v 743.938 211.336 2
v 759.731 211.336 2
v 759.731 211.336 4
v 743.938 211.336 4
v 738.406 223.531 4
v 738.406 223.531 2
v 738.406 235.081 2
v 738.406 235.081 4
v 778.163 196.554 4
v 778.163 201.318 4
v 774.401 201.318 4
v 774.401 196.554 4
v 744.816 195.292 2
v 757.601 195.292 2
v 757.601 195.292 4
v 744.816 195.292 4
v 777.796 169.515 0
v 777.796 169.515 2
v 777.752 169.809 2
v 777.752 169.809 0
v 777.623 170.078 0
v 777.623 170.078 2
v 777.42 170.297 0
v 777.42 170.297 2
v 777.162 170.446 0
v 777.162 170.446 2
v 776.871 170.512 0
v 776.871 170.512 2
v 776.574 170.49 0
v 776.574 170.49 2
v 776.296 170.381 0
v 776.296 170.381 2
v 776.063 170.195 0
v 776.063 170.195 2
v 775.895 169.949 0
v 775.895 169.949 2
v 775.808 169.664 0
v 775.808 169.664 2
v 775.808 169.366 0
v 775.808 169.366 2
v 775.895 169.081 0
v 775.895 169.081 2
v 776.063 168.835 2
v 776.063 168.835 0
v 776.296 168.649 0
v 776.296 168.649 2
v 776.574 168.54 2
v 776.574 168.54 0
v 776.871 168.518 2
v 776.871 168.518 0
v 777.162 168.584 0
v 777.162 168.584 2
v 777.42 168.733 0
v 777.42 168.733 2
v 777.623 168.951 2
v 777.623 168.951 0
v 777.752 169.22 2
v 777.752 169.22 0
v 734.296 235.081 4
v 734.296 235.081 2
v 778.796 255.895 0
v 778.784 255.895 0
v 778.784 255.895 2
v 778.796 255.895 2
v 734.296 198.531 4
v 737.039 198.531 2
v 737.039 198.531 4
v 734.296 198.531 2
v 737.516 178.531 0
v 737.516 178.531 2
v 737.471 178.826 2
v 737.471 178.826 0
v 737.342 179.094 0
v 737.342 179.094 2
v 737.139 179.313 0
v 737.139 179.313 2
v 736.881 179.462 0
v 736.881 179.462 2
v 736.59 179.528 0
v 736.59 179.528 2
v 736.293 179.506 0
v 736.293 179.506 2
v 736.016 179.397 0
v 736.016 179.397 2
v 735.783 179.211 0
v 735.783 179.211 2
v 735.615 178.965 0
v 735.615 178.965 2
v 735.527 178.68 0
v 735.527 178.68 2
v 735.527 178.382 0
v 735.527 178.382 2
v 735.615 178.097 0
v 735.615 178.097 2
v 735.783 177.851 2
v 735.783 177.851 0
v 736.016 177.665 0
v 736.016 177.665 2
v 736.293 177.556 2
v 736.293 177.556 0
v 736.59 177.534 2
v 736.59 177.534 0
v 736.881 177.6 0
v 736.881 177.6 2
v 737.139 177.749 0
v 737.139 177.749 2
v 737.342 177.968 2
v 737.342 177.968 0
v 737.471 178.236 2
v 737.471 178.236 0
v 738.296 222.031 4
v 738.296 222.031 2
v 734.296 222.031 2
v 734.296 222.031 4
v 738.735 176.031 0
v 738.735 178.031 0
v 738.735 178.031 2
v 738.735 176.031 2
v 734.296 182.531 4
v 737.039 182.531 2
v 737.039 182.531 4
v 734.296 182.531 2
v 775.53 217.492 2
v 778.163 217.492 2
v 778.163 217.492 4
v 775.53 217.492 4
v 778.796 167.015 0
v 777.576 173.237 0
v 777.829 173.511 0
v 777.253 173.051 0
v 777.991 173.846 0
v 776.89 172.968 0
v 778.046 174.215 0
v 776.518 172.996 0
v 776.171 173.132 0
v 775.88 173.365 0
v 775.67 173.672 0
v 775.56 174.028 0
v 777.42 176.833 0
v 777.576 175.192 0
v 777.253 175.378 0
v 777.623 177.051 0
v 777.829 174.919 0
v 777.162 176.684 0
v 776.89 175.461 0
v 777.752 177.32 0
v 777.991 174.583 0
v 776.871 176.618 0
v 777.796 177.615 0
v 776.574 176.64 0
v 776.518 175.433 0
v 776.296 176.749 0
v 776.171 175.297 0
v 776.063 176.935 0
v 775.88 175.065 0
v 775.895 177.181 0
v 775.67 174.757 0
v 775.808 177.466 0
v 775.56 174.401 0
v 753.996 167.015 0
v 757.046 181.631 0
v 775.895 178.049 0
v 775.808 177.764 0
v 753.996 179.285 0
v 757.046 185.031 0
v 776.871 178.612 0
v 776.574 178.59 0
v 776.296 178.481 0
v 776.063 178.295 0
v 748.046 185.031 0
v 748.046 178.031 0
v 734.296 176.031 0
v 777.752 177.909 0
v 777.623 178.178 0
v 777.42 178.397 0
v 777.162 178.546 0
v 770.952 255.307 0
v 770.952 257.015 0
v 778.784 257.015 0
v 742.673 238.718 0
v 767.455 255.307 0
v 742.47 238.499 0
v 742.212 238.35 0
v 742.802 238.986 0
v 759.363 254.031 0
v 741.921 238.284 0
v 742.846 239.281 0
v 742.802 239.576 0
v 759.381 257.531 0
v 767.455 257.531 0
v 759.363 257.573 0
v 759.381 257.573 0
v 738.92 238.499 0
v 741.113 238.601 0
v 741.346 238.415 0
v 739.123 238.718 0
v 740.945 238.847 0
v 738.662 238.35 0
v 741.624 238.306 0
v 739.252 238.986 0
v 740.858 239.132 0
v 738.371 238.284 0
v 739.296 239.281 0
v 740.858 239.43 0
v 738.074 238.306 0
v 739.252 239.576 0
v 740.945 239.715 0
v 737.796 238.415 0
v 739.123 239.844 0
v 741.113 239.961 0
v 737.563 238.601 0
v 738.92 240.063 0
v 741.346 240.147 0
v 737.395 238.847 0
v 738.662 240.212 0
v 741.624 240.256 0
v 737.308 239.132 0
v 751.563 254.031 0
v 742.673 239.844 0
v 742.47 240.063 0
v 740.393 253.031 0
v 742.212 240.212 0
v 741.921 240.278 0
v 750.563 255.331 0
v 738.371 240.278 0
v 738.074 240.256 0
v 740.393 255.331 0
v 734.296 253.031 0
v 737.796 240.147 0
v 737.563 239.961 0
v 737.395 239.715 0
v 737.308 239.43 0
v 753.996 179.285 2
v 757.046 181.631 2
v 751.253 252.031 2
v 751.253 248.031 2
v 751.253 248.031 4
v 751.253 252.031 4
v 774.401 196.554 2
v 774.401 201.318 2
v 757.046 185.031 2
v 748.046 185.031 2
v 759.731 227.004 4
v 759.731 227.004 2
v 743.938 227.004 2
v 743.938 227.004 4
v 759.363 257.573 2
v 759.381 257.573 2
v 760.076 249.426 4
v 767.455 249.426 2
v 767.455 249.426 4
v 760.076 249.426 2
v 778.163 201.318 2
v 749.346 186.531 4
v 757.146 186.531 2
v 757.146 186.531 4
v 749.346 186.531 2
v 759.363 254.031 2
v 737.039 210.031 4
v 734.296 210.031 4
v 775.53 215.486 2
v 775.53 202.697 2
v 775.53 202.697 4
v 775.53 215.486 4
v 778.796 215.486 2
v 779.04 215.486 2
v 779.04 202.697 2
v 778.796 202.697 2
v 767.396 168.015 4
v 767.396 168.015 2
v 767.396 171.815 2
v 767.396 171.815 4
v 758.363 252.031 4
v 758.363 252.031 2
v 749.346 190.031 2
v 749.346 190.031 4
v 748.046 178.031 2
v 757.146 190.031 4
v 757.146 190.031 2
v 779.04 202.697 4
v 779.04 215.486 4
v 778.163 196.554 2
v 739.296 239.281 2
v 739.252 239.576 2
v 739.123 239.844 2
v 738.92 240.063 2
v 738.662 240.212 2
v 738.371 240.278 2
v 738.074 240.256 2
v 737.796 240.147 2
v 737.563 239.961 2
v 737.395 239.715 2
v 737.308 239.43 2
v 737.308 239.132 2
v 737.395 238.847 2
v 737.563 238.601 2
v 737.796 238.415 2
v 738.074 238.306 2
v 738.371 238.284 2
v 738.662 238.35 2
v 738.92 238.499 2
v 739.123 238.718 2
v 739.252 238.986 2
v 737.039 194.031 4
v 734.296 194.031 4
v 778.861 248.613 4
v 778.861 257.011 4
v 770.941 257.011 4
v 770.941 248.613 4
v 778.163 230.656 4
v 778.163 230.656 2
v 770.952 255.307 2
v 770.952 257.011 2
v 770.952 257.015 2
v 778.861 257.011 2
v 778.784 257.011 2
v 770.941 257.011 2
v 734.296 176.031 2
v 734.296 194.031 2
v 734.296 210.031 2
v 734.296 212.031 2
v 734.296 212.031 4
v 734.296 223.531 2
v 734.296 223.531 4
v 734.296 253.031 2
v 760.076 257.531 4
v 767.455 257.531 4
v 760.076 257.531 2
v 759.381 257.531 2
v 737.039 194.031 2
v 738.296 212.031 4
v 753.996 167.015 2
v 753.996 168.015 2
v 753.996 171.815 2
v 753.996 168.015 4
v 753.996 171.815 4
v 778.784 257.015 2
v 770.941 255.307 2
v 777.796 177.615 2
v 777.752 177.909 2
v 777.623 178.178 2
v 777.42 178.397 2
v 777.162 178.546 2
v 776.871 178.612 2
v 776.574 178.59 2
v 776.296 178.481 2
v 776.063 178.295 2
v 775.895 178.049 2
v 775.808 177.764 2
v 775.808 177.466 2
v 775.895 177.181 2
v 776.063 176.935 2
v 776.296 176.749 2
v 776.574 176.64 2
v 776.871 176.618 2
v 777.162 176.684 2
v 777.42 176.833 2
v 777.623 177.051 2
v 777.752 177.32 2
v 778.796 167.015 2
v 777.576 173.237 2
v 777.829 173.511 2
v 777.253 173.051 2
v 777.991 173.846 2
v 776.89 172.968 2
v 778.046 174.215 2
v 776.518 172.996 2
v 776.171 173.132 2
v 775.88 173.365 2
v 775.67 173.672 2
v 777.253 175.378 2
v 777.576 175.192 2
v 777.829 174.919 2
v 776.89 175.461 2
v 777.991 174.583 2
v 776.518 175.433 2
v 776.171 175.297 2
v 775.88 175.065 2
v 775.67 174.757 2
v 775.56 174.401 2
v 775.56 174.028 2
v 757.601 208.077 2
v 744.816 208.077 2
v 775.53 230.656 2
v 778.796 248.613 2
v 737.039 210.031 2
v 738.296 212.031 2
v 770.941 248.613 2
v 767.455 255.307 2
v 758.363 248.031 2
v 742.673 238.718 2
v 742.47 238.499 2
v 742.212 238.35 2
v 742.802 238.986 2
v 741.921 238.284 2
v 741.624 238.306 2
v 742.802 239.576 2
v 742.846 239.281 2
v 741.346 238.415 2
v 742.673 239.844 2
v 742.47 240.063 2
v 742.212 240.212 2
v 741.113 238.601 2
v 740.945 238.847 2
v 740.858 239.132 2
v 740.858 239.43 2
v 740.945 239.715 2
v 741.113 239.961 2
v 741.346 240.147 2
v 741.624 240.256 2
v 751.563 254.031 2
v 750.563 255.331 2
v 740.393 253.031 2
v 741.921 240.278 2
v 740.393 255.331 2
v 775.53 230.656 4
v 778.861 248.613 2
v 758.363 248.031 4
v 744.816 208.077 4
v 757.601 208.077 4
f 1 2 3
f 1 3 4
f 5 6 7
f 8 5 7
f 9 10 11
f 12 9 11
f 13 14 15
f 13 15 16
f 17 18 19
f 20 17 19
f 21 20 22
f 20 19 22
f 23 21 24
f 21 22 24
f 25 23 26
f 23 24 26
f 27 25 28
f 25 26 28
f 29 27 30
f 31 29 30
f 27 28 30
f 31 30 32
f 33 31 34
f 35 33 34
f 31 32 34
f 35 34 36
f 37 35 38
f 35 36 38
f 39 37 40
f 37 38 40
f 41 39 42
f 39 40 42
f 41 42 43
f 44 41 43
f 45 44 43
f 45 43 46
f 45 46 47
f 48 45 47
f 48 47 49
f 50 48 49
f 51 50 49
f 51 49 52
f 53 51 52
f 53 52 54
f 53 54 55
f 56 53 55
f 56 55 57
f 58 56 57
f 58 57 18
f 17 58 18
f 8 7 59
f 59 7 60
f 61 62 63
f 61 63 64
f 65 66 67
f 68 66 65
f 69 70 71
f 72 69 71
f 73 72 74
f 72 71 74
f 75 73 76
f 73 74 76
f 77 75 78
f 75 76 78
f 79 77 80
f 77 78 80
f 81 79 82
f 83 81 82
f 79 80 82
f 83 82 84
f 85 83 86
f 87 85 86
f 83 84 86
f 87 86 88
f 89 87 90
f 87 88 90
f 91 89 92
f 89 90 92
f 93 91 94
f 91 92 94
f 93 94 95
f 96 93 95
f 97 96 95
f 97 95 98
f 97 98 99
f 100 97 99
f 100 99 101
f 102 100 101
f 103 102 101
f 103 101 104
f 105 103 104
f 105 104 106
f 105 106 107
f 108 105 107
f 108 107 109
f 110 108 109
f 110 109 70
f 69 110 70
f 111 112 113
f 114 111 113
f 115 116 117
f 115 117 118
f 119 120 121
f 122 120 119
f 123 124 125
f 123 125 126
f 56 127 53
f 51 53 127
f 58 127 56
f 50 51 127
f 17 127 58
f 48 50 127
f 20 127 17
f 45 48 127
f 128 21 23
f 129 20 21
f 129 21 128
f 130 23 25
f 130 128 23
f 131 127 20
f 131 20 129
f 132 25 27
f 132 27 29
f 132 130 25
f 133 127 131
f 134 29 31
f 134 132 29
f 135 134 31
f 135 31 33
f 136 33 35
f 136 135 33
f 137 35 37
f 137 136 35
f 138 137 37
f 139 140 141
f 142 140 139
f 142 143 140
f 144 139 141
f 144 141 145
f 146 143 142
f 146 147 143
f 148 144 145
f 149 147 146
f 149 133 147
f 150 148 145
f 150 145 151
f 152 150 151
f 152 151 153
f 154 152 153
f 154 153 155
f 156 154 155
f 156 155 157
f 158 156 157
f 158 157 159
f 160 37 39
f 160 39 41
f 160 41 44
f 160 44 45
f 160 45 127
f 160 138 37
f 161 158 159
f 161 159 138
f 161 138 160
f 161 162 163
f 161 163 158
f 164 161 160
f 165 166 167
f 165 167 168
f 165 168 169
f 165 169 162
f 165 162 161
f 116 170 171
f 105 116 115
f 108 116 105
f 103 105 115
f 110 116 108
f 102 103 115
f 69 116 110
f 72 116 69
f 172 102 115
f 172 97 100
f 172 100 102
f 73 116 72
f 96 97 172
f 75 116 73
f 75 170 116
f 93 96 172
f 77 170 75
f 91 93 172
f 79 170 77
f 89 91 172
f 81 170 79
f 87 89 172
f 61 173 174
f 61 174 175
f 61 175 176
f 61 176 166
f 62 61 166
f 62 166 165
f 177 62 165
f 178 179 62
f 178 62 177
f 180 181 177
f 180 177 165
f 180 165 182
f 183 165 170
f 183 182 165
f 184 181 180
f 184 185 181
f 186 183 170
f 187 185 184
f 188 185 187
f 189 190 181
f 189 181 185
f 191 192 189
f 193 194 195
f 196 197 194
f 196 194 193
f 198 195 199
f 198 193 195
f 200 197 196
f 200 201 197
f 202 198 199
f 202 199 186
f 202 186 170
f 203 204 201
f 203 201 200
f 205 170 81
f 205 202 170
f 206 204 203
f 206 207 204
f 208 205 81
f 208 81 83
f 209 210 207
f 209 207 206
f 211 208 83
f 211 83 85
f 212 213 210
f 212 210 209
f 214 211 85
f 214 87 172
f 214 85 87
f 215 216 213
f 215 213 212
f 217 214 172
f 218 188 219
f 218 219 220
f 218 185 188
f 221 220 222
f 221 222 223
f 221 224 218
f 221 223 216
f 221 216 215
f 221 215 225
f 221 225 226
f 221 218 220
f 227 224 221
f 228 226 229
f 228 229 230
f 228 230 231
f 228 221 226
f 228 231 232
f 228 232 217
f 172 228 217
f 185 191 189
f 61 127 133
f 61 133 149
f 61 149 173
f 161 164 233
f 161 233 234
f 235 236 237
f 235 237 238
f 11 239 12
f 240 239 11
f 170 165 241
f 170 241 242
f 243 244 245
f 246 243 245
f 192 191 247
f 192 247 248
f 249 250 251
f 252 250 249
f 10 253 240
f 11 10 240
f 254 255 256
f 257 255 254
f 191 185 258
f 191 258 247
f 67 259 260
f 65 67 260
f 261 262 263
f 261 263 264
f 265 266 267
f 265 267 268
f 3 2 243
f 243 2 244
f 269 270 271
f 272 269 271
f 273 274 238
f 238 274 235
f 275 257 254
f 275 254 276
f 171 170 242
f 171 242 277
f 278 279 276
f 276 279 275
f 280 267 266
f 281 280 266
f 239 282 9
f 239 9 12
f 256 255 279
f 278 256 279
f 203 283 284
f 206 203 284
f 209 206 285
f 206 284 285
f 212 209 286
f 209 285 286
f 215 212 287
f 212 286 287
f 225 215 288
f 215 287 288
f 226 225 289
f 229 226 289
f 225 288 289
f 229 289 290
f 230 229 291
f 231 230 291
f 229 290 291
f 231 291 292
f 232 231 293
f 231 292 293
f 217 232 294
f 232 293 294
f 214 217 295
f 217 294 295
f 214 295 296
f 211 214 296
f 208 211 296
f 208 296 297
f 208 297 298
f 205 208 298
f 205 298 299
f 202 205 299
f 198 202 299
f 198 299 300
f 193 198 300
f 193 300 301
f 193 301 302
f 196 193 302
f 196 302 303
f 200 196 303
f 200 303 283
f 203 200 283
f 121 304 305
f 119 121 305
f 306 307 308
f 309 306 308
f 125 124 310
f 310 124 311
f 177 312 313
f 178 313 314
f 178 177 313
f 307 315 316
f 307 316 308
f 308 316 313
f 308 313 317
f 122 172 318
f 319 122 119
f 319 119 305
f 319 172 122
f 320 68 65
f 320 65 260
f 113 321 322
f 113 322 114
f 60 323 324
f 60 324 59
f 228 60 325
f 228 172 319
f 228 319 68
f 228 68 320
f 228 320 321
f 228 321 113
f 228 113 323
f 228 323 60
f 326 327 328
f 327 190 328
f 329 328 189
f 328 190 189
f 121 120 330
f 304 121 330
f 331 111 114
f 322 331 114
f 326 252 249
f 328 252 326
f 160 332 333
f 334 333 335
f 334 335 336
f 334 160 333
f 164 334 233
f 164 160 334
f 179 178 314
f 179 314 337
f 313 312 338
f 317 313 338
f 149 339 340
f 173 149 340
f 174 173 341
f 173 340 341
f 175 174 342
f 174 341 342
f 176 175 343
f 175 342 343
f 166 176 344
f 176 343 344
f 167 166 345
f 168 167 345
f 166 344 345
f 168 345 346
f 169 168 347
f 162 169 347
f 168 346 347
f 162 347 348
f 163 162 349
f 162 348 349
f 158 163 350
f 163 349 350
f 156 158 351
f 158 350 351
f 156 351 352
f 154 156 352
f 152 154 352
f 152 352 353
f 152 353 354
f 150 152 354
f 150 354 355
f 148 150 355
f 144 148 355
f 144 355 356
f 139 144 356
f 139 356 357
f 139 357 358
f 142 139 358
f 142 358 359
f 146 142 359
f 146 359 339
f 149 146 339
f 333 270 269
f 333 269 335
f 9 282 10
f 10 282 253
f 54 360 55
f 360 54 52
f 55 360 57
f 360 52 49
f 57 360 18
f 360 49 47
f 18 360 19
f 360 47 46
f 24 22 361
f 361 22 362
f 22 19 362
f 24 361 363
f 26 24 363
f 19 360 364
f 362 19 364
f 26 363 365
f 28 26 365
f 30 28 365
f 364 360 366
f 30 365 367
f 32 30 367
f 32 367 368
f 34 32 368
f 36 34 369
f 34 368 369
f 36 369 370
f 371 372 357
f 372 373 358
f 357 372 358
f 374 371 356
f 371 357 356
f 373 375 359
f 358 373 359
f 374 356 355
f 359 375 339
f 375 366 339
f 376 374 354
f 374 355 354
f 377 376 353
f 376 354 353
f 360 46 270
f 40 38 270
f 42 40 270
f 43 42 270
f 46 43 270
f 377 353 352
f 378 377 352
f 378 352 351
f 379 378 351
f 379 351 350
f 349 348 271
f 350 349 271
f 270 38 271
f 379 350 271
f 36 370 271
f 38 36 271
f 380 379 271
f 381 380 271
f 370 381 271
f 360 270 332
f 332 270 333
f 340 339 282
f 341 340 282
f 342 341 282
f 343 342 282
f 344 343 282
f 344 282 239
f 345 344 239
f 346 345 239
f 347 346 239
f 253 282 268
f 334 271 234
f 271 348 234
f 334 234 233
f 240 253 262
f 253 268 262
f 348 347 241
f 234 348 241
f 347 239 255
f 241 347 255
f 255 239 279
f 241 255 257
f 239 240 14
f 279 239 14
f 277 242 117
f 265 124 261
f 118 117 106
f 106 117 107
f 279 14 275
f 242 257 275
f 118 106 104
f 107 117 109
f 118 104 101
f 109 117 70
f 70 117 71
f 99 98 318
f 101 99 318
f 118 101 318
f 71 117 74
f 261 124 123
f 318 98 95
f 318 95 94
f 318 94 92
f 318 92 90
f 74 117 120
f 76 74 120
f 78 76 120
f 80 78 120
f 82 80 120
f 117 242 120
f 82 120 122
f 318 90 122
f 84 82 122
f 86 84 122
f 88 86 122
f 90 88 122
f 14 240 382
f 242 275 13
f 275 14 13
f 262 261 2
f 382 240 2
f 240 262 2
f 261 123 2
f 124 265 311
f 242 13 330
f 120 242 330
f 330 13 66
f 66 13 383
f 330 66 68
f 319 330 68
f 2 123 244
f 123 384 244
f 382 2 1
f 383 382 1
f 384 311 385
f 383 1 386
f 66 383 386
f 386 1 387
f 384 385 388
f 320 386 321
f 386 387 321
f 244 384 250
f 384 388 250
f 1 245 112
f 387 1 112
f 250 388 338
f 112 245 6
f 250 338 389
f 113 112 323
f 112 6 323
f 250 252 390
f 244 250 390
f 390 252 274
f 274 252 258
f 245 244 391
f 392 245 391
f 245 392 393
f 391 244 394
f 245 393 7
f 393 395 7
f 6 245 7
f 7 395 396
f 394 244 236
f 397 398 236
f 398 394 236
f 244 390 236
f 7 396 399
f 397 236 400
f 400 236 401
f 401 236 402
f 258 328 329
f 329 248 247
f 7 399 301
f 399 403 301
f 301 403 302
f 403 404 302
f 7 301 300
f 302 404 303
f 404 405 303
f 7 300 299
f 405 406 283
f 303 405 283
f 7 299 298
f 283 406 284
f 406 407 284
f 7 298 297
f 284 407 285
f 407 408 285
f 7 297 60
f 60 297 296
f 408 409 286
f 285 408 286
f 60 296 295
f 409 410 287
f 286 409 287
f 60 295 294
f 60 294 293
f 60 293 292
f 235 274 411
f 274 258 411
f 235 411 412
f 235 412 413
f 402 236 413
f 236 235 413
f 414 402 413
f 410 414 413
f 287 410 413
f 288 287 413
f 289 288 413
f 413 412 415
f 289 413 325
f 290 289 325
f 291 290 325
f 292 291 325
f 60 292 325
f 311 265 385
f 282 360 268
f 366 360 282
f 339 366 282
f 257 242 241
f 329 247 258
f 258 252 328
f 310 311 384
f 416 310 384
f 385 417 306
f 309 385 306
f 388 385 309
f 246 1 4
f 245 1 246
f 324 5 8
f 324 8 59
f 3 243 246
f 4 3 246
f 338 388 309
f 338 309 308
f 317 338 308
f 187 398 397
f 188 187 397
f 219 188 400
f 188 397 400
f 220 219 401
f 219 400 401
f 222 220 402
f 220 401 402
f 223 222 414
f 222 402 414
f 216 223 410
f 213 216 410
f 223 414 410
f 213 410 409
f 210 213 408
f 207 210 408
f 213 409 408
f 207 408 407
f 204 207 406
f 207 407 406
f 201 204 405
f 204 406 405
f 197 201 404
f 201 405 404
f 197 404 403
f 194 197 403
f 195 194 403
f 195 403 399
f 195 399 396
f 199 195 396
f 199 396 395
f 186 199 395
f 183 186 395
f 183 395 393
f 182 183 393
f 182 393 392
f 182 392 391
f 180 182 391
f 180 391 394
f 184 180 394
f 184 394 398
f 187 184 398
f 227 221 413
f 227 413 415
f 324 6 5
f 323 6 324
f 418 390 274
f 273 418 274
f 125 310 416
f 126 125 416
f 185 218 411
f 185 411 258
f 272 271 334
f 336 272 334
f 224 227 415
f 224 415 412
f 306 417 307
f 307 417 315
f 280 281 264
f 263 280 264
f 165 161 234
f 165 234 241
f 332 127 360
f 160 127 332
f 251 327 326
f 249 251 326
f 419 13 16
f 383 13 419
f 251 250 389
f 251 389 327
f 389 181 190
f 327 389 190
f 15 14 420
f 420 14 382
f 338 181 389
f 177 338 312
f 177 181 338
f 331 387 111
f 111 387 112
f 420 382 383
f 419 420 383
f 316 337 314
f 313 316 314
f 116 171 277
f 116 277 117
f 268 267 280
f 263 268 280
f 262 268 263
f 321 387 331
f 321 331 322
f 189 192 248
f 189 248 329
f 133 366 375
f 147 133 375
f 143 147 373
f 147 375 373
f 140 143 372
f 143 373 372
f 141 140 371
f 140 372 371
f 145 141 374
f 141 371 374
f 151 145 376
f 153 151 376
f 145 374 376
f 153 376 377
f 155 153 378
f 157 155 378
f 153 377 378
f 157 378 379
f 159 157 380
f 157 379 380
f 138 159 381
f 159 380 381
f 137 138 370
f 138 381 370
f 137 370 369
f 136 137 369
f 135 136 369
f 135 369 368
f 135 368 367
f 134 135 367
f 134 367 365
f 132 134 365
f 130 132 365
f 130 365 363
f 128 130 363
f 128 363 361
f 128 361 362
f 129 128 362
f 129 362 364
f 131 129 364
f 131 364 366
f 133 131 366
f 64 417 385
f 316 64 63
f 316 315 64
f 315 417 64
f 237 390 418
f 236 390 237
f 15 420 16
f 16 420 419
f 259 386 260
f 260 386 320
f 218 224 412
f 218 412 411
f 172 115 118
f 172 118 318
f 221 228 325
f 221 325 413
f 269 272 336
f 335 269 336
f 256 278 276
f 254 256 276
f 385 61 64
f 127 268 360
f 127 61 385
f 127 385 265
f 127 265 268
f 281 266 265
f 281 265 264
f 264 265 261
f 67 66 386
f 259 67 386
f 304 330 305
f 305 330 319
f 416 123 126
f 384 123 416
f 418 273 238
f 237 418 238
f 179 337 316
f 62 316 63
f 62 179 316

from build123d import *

# Parameters (mm, degrees)
BOSS_EXTRU_1_DEPTH  = 2
ESQUISSE3_W         = 15.79325035
ESQUISSE3_H         = 15.667907094
BOSS_EXTRU_3_DEPTH  = 2
ESQUISSE4_W         = 12.785012189
ESQUISSE4_H         = 12.785012188
BOSS_EXTRU_4_DEPTH  = 2
ESQUISSE5_W         = 7.91948101
ESQUISSE5_H         = 8.397998202
BOSS_EXTRU_5_DEPTH  = 2
ESQUISSE6_W         = 7.37870607
ESQUISSE6_H         = 8.10533589
BOSS_EXTRU_6_DEPTH  = 2
ESQUISSE7_W         = 2.632934746
ESQUISSE7_H         = 13.164673727
ESQUISSE7_W_2       = 3.510579661
ESQUISSE7_H_2       = 12.788540192
ESQUISSE7_W_3       = 3.761335351
ESQUISSE7_H_3       = 4.764358111
ESQUISSE7_W_4       = 7.8
ESQUISSE7_H_4       = 3.5
ESQUISSE7_W_5       = 13.4
ESQUISSE7_H_5       = 3.8
ESQUISSE7_W_6       = 2.742200186
ESQUISSE7_H_6       = 11.5
ESQUISSE7_W_7       = 4
ESQUISSE7_H_7       = 10
ESQUISSE7_W_8       = 7.11
ESQUISSE7_H_8       = 4
ESQUISSE7_W_9       = 4.11
ESQUISSE7_H_9       = 11.55
BOSS_EXTRU_7_DEPTH  = 2
SKETCH_3_R          = 1
SKETCH_3_R_2        = 1.25
CUT_EXTRUDE_4_DEPTH = 10
SKETCH_1_R          = 1
CUT_EXTRUDE_5_DEPTH = 10
SKETCH_2_R          = 1
CUT_EXTRUDE_6_DEPTH = 10


with BuildPart() as part:
    # Esquisse1 → Boss.-Extru.1 (new body)
    with BuildSketch(Plane.XY):
        Polygon((778.796370306, 167.014727296), (753.996370306, 167.014727296), (753.996370306, 179.284727296), (757.046370306, 181.630881142), (757.046370306, 185.030881142), (748.046370306, 185.030881142), (748.046370306, 178.030881142), (738.734755108, 178.030881142), (738.734755108, 176.030881142), (734.296370306, 176.030881142), (734.296370306, 253.030881142), (740.392724327, 253.030881142), (740.392724327, 255.330881142), (750.563009525, 255.330881142), (751.563009525, 254.030881142), (759.363009525, 254.030881142), (759.363009525, 257.573130323), (759.380880171, 257.573130323), (759.380880171, 257.530881142), (767.454666434, 257.530881142), (767.454666434, 255.306621268), (770.951996508, 255.306621268), (770.951996508, 257.014727296), (778.78419371, 257.014727296), (778.78419371, 255.894727296), (778.796370306, 255.894727296), align=None)
    extrude(amount=BOSS_EXTRU_1_DEPTH)

    # Esquisse3 → Boss.-Extru.3 (add)
    with BuildSketch(Plane(origin=(0, 0, 2), x_dir=(-1, 0, 0), z_dir=(0, 0, -1))):
        with Locations((-751.834833735, 219.169546492)):
            Rectangle(ESQUISSE3_W, ESQUISSE3_H)
    extrude(amount=-BOSS_EXTRU_3_DEPTH)

    # Esquisse4 → Boss.-Extru.4 (add)
    with BuildSketch(Plane(origin=(0, 0, 2), x_dir=(-1, 0, 0), z_dir=(0, 0, -1))):
        with Locations((-751.208117452, 201.684162176)):
            Rectangle(ESQUISSE4_W, ESQUISSE4_H)
    extrude(amount=-BOSS_EXTRU_4_DEPTH)

    # Esquisse5 → Boss.-Extru.5 (add)
    with BuildSketch(Plane(origin=(0, 0, 2), x_dir=(-1, 0, 0), z_dir=(0, 0, -1))):
        with Locations((-774.900958926, 252.812156779)):
            Rectangle(ESQUISSE5_W, ESQUISSE5_H)
    extrude(amount=-BOSS_EXTRU_5_DEPTH)

    # Esquisse6 → Boss.-Extru.6 (add)
    with BuildSketch(Plane(origin=(0, 0, 2), x_dir=(-1, 0, 0), z_dir=(0, 0, -1))):
        with Locations((-763.765313399, 253.478213197)):
            Rectangle(ESQUISSE6_W, ESQUISSE6_H)
    extrude(amount=-BOSS_EXTRU_6_DEPTH)

    # Esquisse7 → Boss.-Extru.7 (add)
    with BuildSketch(Plane(origin=(0, 0, 2), x_dir=(-1, 0, 0), z_dir=(0, 0, -1))):
        with Locations((-776.846036285, 224.074096482)):
            Rectangle(ESQUISSE7_W, ESQUISSE7_H)
        with Locations((-777.284858743, 209.091444002)):
            Rectangle(ESQUISSE7_W_2, ESQUISSE7_H_2)
        with Locations((-776.281835983, 198.935838556)):
            Rectangle(ESQUISSE7_W_3, ESQUISSE7_H_3)
        with Locations((-753.246370306, 188.280881142)):
            Rectangle(ESQUISSE7_W_4, ESQUISSE7_H_4)
        with Locations((-760.696370306, 169.914727296)):
            Rectangle(ESQUISSE7_W_5, ESQUISSE7_H_5)
        with Locations((-735.667470399, 188.280881142)):
            Rectangle(ESQUISSE7_W_6, ESQUISSE7_H_6)
        with Locations((-735.667470399, 204.280881142)):
            Rectangle(ESQUISSE7_W_6, ESQUISSE7_H_6)
        with Locations((-736.296370306, 217.030881142)):
            Rectangle(ESQUISSE7_W_7, ESQUISSE7_H_7)
        with Locations((-754.808009525, 250.030881142)):
            Rectangle(ESQUISSE7_W_8, ESQUISSE7_H_8)
        with Locations((-736.351370306, 229.305881142)):
            Rectangle(ESQUISSE7_W_9, ESQUISSE7_H_9)
    extrude(amount=-BOSS_EXTRU_7_DEPTH)

    # Эскиз3 → Вырез-Вытянуть4 (cut)
    with BuildSketch(Plane.XY.offset(2)):
        with Locations((738.296370306, 239.280881142)):
            Circle(SKETCH_3_R)
        with Locations((741.846370306, 239.280881142)):
            Circle(SKETCH_3_R)
        with Locations((776.796370306, 174.214727296)):
            Circle(SKETCH_3_R_2)
        with Locations((776.796370306, 177.614727296)):
            Circle(SKETCH_3_R)
    extrude(amount=-CUT_EXTRUDE_4_DEPTH, mode=Mode.SUBTRACT)

    # Эскиз1 → Вырез-Вытянуть5 (cut)
    with BuildSketch(Plane.XY.offset(2)):
        with Locations((736.515562707, 178.530881142)):
            Circle(SKETCH_1_R)
    extrude(amount=-CUT_EXTRUDE_5_DEPTH, mode=Mode.SUBTRACT)

    # Эскиз2 → Вырез-Вытянуть6 (cut)
    with BuildSketch(Plane.XY.offset(2)):
        with Locations((776.796370306, 169.514727296)):
            Circle(SKETCH_2_R)
    extrude(amount=-CUT_EXTRUDE_6_DEPTH, mode=Mode.SUBTRACT)


solid = part.part
